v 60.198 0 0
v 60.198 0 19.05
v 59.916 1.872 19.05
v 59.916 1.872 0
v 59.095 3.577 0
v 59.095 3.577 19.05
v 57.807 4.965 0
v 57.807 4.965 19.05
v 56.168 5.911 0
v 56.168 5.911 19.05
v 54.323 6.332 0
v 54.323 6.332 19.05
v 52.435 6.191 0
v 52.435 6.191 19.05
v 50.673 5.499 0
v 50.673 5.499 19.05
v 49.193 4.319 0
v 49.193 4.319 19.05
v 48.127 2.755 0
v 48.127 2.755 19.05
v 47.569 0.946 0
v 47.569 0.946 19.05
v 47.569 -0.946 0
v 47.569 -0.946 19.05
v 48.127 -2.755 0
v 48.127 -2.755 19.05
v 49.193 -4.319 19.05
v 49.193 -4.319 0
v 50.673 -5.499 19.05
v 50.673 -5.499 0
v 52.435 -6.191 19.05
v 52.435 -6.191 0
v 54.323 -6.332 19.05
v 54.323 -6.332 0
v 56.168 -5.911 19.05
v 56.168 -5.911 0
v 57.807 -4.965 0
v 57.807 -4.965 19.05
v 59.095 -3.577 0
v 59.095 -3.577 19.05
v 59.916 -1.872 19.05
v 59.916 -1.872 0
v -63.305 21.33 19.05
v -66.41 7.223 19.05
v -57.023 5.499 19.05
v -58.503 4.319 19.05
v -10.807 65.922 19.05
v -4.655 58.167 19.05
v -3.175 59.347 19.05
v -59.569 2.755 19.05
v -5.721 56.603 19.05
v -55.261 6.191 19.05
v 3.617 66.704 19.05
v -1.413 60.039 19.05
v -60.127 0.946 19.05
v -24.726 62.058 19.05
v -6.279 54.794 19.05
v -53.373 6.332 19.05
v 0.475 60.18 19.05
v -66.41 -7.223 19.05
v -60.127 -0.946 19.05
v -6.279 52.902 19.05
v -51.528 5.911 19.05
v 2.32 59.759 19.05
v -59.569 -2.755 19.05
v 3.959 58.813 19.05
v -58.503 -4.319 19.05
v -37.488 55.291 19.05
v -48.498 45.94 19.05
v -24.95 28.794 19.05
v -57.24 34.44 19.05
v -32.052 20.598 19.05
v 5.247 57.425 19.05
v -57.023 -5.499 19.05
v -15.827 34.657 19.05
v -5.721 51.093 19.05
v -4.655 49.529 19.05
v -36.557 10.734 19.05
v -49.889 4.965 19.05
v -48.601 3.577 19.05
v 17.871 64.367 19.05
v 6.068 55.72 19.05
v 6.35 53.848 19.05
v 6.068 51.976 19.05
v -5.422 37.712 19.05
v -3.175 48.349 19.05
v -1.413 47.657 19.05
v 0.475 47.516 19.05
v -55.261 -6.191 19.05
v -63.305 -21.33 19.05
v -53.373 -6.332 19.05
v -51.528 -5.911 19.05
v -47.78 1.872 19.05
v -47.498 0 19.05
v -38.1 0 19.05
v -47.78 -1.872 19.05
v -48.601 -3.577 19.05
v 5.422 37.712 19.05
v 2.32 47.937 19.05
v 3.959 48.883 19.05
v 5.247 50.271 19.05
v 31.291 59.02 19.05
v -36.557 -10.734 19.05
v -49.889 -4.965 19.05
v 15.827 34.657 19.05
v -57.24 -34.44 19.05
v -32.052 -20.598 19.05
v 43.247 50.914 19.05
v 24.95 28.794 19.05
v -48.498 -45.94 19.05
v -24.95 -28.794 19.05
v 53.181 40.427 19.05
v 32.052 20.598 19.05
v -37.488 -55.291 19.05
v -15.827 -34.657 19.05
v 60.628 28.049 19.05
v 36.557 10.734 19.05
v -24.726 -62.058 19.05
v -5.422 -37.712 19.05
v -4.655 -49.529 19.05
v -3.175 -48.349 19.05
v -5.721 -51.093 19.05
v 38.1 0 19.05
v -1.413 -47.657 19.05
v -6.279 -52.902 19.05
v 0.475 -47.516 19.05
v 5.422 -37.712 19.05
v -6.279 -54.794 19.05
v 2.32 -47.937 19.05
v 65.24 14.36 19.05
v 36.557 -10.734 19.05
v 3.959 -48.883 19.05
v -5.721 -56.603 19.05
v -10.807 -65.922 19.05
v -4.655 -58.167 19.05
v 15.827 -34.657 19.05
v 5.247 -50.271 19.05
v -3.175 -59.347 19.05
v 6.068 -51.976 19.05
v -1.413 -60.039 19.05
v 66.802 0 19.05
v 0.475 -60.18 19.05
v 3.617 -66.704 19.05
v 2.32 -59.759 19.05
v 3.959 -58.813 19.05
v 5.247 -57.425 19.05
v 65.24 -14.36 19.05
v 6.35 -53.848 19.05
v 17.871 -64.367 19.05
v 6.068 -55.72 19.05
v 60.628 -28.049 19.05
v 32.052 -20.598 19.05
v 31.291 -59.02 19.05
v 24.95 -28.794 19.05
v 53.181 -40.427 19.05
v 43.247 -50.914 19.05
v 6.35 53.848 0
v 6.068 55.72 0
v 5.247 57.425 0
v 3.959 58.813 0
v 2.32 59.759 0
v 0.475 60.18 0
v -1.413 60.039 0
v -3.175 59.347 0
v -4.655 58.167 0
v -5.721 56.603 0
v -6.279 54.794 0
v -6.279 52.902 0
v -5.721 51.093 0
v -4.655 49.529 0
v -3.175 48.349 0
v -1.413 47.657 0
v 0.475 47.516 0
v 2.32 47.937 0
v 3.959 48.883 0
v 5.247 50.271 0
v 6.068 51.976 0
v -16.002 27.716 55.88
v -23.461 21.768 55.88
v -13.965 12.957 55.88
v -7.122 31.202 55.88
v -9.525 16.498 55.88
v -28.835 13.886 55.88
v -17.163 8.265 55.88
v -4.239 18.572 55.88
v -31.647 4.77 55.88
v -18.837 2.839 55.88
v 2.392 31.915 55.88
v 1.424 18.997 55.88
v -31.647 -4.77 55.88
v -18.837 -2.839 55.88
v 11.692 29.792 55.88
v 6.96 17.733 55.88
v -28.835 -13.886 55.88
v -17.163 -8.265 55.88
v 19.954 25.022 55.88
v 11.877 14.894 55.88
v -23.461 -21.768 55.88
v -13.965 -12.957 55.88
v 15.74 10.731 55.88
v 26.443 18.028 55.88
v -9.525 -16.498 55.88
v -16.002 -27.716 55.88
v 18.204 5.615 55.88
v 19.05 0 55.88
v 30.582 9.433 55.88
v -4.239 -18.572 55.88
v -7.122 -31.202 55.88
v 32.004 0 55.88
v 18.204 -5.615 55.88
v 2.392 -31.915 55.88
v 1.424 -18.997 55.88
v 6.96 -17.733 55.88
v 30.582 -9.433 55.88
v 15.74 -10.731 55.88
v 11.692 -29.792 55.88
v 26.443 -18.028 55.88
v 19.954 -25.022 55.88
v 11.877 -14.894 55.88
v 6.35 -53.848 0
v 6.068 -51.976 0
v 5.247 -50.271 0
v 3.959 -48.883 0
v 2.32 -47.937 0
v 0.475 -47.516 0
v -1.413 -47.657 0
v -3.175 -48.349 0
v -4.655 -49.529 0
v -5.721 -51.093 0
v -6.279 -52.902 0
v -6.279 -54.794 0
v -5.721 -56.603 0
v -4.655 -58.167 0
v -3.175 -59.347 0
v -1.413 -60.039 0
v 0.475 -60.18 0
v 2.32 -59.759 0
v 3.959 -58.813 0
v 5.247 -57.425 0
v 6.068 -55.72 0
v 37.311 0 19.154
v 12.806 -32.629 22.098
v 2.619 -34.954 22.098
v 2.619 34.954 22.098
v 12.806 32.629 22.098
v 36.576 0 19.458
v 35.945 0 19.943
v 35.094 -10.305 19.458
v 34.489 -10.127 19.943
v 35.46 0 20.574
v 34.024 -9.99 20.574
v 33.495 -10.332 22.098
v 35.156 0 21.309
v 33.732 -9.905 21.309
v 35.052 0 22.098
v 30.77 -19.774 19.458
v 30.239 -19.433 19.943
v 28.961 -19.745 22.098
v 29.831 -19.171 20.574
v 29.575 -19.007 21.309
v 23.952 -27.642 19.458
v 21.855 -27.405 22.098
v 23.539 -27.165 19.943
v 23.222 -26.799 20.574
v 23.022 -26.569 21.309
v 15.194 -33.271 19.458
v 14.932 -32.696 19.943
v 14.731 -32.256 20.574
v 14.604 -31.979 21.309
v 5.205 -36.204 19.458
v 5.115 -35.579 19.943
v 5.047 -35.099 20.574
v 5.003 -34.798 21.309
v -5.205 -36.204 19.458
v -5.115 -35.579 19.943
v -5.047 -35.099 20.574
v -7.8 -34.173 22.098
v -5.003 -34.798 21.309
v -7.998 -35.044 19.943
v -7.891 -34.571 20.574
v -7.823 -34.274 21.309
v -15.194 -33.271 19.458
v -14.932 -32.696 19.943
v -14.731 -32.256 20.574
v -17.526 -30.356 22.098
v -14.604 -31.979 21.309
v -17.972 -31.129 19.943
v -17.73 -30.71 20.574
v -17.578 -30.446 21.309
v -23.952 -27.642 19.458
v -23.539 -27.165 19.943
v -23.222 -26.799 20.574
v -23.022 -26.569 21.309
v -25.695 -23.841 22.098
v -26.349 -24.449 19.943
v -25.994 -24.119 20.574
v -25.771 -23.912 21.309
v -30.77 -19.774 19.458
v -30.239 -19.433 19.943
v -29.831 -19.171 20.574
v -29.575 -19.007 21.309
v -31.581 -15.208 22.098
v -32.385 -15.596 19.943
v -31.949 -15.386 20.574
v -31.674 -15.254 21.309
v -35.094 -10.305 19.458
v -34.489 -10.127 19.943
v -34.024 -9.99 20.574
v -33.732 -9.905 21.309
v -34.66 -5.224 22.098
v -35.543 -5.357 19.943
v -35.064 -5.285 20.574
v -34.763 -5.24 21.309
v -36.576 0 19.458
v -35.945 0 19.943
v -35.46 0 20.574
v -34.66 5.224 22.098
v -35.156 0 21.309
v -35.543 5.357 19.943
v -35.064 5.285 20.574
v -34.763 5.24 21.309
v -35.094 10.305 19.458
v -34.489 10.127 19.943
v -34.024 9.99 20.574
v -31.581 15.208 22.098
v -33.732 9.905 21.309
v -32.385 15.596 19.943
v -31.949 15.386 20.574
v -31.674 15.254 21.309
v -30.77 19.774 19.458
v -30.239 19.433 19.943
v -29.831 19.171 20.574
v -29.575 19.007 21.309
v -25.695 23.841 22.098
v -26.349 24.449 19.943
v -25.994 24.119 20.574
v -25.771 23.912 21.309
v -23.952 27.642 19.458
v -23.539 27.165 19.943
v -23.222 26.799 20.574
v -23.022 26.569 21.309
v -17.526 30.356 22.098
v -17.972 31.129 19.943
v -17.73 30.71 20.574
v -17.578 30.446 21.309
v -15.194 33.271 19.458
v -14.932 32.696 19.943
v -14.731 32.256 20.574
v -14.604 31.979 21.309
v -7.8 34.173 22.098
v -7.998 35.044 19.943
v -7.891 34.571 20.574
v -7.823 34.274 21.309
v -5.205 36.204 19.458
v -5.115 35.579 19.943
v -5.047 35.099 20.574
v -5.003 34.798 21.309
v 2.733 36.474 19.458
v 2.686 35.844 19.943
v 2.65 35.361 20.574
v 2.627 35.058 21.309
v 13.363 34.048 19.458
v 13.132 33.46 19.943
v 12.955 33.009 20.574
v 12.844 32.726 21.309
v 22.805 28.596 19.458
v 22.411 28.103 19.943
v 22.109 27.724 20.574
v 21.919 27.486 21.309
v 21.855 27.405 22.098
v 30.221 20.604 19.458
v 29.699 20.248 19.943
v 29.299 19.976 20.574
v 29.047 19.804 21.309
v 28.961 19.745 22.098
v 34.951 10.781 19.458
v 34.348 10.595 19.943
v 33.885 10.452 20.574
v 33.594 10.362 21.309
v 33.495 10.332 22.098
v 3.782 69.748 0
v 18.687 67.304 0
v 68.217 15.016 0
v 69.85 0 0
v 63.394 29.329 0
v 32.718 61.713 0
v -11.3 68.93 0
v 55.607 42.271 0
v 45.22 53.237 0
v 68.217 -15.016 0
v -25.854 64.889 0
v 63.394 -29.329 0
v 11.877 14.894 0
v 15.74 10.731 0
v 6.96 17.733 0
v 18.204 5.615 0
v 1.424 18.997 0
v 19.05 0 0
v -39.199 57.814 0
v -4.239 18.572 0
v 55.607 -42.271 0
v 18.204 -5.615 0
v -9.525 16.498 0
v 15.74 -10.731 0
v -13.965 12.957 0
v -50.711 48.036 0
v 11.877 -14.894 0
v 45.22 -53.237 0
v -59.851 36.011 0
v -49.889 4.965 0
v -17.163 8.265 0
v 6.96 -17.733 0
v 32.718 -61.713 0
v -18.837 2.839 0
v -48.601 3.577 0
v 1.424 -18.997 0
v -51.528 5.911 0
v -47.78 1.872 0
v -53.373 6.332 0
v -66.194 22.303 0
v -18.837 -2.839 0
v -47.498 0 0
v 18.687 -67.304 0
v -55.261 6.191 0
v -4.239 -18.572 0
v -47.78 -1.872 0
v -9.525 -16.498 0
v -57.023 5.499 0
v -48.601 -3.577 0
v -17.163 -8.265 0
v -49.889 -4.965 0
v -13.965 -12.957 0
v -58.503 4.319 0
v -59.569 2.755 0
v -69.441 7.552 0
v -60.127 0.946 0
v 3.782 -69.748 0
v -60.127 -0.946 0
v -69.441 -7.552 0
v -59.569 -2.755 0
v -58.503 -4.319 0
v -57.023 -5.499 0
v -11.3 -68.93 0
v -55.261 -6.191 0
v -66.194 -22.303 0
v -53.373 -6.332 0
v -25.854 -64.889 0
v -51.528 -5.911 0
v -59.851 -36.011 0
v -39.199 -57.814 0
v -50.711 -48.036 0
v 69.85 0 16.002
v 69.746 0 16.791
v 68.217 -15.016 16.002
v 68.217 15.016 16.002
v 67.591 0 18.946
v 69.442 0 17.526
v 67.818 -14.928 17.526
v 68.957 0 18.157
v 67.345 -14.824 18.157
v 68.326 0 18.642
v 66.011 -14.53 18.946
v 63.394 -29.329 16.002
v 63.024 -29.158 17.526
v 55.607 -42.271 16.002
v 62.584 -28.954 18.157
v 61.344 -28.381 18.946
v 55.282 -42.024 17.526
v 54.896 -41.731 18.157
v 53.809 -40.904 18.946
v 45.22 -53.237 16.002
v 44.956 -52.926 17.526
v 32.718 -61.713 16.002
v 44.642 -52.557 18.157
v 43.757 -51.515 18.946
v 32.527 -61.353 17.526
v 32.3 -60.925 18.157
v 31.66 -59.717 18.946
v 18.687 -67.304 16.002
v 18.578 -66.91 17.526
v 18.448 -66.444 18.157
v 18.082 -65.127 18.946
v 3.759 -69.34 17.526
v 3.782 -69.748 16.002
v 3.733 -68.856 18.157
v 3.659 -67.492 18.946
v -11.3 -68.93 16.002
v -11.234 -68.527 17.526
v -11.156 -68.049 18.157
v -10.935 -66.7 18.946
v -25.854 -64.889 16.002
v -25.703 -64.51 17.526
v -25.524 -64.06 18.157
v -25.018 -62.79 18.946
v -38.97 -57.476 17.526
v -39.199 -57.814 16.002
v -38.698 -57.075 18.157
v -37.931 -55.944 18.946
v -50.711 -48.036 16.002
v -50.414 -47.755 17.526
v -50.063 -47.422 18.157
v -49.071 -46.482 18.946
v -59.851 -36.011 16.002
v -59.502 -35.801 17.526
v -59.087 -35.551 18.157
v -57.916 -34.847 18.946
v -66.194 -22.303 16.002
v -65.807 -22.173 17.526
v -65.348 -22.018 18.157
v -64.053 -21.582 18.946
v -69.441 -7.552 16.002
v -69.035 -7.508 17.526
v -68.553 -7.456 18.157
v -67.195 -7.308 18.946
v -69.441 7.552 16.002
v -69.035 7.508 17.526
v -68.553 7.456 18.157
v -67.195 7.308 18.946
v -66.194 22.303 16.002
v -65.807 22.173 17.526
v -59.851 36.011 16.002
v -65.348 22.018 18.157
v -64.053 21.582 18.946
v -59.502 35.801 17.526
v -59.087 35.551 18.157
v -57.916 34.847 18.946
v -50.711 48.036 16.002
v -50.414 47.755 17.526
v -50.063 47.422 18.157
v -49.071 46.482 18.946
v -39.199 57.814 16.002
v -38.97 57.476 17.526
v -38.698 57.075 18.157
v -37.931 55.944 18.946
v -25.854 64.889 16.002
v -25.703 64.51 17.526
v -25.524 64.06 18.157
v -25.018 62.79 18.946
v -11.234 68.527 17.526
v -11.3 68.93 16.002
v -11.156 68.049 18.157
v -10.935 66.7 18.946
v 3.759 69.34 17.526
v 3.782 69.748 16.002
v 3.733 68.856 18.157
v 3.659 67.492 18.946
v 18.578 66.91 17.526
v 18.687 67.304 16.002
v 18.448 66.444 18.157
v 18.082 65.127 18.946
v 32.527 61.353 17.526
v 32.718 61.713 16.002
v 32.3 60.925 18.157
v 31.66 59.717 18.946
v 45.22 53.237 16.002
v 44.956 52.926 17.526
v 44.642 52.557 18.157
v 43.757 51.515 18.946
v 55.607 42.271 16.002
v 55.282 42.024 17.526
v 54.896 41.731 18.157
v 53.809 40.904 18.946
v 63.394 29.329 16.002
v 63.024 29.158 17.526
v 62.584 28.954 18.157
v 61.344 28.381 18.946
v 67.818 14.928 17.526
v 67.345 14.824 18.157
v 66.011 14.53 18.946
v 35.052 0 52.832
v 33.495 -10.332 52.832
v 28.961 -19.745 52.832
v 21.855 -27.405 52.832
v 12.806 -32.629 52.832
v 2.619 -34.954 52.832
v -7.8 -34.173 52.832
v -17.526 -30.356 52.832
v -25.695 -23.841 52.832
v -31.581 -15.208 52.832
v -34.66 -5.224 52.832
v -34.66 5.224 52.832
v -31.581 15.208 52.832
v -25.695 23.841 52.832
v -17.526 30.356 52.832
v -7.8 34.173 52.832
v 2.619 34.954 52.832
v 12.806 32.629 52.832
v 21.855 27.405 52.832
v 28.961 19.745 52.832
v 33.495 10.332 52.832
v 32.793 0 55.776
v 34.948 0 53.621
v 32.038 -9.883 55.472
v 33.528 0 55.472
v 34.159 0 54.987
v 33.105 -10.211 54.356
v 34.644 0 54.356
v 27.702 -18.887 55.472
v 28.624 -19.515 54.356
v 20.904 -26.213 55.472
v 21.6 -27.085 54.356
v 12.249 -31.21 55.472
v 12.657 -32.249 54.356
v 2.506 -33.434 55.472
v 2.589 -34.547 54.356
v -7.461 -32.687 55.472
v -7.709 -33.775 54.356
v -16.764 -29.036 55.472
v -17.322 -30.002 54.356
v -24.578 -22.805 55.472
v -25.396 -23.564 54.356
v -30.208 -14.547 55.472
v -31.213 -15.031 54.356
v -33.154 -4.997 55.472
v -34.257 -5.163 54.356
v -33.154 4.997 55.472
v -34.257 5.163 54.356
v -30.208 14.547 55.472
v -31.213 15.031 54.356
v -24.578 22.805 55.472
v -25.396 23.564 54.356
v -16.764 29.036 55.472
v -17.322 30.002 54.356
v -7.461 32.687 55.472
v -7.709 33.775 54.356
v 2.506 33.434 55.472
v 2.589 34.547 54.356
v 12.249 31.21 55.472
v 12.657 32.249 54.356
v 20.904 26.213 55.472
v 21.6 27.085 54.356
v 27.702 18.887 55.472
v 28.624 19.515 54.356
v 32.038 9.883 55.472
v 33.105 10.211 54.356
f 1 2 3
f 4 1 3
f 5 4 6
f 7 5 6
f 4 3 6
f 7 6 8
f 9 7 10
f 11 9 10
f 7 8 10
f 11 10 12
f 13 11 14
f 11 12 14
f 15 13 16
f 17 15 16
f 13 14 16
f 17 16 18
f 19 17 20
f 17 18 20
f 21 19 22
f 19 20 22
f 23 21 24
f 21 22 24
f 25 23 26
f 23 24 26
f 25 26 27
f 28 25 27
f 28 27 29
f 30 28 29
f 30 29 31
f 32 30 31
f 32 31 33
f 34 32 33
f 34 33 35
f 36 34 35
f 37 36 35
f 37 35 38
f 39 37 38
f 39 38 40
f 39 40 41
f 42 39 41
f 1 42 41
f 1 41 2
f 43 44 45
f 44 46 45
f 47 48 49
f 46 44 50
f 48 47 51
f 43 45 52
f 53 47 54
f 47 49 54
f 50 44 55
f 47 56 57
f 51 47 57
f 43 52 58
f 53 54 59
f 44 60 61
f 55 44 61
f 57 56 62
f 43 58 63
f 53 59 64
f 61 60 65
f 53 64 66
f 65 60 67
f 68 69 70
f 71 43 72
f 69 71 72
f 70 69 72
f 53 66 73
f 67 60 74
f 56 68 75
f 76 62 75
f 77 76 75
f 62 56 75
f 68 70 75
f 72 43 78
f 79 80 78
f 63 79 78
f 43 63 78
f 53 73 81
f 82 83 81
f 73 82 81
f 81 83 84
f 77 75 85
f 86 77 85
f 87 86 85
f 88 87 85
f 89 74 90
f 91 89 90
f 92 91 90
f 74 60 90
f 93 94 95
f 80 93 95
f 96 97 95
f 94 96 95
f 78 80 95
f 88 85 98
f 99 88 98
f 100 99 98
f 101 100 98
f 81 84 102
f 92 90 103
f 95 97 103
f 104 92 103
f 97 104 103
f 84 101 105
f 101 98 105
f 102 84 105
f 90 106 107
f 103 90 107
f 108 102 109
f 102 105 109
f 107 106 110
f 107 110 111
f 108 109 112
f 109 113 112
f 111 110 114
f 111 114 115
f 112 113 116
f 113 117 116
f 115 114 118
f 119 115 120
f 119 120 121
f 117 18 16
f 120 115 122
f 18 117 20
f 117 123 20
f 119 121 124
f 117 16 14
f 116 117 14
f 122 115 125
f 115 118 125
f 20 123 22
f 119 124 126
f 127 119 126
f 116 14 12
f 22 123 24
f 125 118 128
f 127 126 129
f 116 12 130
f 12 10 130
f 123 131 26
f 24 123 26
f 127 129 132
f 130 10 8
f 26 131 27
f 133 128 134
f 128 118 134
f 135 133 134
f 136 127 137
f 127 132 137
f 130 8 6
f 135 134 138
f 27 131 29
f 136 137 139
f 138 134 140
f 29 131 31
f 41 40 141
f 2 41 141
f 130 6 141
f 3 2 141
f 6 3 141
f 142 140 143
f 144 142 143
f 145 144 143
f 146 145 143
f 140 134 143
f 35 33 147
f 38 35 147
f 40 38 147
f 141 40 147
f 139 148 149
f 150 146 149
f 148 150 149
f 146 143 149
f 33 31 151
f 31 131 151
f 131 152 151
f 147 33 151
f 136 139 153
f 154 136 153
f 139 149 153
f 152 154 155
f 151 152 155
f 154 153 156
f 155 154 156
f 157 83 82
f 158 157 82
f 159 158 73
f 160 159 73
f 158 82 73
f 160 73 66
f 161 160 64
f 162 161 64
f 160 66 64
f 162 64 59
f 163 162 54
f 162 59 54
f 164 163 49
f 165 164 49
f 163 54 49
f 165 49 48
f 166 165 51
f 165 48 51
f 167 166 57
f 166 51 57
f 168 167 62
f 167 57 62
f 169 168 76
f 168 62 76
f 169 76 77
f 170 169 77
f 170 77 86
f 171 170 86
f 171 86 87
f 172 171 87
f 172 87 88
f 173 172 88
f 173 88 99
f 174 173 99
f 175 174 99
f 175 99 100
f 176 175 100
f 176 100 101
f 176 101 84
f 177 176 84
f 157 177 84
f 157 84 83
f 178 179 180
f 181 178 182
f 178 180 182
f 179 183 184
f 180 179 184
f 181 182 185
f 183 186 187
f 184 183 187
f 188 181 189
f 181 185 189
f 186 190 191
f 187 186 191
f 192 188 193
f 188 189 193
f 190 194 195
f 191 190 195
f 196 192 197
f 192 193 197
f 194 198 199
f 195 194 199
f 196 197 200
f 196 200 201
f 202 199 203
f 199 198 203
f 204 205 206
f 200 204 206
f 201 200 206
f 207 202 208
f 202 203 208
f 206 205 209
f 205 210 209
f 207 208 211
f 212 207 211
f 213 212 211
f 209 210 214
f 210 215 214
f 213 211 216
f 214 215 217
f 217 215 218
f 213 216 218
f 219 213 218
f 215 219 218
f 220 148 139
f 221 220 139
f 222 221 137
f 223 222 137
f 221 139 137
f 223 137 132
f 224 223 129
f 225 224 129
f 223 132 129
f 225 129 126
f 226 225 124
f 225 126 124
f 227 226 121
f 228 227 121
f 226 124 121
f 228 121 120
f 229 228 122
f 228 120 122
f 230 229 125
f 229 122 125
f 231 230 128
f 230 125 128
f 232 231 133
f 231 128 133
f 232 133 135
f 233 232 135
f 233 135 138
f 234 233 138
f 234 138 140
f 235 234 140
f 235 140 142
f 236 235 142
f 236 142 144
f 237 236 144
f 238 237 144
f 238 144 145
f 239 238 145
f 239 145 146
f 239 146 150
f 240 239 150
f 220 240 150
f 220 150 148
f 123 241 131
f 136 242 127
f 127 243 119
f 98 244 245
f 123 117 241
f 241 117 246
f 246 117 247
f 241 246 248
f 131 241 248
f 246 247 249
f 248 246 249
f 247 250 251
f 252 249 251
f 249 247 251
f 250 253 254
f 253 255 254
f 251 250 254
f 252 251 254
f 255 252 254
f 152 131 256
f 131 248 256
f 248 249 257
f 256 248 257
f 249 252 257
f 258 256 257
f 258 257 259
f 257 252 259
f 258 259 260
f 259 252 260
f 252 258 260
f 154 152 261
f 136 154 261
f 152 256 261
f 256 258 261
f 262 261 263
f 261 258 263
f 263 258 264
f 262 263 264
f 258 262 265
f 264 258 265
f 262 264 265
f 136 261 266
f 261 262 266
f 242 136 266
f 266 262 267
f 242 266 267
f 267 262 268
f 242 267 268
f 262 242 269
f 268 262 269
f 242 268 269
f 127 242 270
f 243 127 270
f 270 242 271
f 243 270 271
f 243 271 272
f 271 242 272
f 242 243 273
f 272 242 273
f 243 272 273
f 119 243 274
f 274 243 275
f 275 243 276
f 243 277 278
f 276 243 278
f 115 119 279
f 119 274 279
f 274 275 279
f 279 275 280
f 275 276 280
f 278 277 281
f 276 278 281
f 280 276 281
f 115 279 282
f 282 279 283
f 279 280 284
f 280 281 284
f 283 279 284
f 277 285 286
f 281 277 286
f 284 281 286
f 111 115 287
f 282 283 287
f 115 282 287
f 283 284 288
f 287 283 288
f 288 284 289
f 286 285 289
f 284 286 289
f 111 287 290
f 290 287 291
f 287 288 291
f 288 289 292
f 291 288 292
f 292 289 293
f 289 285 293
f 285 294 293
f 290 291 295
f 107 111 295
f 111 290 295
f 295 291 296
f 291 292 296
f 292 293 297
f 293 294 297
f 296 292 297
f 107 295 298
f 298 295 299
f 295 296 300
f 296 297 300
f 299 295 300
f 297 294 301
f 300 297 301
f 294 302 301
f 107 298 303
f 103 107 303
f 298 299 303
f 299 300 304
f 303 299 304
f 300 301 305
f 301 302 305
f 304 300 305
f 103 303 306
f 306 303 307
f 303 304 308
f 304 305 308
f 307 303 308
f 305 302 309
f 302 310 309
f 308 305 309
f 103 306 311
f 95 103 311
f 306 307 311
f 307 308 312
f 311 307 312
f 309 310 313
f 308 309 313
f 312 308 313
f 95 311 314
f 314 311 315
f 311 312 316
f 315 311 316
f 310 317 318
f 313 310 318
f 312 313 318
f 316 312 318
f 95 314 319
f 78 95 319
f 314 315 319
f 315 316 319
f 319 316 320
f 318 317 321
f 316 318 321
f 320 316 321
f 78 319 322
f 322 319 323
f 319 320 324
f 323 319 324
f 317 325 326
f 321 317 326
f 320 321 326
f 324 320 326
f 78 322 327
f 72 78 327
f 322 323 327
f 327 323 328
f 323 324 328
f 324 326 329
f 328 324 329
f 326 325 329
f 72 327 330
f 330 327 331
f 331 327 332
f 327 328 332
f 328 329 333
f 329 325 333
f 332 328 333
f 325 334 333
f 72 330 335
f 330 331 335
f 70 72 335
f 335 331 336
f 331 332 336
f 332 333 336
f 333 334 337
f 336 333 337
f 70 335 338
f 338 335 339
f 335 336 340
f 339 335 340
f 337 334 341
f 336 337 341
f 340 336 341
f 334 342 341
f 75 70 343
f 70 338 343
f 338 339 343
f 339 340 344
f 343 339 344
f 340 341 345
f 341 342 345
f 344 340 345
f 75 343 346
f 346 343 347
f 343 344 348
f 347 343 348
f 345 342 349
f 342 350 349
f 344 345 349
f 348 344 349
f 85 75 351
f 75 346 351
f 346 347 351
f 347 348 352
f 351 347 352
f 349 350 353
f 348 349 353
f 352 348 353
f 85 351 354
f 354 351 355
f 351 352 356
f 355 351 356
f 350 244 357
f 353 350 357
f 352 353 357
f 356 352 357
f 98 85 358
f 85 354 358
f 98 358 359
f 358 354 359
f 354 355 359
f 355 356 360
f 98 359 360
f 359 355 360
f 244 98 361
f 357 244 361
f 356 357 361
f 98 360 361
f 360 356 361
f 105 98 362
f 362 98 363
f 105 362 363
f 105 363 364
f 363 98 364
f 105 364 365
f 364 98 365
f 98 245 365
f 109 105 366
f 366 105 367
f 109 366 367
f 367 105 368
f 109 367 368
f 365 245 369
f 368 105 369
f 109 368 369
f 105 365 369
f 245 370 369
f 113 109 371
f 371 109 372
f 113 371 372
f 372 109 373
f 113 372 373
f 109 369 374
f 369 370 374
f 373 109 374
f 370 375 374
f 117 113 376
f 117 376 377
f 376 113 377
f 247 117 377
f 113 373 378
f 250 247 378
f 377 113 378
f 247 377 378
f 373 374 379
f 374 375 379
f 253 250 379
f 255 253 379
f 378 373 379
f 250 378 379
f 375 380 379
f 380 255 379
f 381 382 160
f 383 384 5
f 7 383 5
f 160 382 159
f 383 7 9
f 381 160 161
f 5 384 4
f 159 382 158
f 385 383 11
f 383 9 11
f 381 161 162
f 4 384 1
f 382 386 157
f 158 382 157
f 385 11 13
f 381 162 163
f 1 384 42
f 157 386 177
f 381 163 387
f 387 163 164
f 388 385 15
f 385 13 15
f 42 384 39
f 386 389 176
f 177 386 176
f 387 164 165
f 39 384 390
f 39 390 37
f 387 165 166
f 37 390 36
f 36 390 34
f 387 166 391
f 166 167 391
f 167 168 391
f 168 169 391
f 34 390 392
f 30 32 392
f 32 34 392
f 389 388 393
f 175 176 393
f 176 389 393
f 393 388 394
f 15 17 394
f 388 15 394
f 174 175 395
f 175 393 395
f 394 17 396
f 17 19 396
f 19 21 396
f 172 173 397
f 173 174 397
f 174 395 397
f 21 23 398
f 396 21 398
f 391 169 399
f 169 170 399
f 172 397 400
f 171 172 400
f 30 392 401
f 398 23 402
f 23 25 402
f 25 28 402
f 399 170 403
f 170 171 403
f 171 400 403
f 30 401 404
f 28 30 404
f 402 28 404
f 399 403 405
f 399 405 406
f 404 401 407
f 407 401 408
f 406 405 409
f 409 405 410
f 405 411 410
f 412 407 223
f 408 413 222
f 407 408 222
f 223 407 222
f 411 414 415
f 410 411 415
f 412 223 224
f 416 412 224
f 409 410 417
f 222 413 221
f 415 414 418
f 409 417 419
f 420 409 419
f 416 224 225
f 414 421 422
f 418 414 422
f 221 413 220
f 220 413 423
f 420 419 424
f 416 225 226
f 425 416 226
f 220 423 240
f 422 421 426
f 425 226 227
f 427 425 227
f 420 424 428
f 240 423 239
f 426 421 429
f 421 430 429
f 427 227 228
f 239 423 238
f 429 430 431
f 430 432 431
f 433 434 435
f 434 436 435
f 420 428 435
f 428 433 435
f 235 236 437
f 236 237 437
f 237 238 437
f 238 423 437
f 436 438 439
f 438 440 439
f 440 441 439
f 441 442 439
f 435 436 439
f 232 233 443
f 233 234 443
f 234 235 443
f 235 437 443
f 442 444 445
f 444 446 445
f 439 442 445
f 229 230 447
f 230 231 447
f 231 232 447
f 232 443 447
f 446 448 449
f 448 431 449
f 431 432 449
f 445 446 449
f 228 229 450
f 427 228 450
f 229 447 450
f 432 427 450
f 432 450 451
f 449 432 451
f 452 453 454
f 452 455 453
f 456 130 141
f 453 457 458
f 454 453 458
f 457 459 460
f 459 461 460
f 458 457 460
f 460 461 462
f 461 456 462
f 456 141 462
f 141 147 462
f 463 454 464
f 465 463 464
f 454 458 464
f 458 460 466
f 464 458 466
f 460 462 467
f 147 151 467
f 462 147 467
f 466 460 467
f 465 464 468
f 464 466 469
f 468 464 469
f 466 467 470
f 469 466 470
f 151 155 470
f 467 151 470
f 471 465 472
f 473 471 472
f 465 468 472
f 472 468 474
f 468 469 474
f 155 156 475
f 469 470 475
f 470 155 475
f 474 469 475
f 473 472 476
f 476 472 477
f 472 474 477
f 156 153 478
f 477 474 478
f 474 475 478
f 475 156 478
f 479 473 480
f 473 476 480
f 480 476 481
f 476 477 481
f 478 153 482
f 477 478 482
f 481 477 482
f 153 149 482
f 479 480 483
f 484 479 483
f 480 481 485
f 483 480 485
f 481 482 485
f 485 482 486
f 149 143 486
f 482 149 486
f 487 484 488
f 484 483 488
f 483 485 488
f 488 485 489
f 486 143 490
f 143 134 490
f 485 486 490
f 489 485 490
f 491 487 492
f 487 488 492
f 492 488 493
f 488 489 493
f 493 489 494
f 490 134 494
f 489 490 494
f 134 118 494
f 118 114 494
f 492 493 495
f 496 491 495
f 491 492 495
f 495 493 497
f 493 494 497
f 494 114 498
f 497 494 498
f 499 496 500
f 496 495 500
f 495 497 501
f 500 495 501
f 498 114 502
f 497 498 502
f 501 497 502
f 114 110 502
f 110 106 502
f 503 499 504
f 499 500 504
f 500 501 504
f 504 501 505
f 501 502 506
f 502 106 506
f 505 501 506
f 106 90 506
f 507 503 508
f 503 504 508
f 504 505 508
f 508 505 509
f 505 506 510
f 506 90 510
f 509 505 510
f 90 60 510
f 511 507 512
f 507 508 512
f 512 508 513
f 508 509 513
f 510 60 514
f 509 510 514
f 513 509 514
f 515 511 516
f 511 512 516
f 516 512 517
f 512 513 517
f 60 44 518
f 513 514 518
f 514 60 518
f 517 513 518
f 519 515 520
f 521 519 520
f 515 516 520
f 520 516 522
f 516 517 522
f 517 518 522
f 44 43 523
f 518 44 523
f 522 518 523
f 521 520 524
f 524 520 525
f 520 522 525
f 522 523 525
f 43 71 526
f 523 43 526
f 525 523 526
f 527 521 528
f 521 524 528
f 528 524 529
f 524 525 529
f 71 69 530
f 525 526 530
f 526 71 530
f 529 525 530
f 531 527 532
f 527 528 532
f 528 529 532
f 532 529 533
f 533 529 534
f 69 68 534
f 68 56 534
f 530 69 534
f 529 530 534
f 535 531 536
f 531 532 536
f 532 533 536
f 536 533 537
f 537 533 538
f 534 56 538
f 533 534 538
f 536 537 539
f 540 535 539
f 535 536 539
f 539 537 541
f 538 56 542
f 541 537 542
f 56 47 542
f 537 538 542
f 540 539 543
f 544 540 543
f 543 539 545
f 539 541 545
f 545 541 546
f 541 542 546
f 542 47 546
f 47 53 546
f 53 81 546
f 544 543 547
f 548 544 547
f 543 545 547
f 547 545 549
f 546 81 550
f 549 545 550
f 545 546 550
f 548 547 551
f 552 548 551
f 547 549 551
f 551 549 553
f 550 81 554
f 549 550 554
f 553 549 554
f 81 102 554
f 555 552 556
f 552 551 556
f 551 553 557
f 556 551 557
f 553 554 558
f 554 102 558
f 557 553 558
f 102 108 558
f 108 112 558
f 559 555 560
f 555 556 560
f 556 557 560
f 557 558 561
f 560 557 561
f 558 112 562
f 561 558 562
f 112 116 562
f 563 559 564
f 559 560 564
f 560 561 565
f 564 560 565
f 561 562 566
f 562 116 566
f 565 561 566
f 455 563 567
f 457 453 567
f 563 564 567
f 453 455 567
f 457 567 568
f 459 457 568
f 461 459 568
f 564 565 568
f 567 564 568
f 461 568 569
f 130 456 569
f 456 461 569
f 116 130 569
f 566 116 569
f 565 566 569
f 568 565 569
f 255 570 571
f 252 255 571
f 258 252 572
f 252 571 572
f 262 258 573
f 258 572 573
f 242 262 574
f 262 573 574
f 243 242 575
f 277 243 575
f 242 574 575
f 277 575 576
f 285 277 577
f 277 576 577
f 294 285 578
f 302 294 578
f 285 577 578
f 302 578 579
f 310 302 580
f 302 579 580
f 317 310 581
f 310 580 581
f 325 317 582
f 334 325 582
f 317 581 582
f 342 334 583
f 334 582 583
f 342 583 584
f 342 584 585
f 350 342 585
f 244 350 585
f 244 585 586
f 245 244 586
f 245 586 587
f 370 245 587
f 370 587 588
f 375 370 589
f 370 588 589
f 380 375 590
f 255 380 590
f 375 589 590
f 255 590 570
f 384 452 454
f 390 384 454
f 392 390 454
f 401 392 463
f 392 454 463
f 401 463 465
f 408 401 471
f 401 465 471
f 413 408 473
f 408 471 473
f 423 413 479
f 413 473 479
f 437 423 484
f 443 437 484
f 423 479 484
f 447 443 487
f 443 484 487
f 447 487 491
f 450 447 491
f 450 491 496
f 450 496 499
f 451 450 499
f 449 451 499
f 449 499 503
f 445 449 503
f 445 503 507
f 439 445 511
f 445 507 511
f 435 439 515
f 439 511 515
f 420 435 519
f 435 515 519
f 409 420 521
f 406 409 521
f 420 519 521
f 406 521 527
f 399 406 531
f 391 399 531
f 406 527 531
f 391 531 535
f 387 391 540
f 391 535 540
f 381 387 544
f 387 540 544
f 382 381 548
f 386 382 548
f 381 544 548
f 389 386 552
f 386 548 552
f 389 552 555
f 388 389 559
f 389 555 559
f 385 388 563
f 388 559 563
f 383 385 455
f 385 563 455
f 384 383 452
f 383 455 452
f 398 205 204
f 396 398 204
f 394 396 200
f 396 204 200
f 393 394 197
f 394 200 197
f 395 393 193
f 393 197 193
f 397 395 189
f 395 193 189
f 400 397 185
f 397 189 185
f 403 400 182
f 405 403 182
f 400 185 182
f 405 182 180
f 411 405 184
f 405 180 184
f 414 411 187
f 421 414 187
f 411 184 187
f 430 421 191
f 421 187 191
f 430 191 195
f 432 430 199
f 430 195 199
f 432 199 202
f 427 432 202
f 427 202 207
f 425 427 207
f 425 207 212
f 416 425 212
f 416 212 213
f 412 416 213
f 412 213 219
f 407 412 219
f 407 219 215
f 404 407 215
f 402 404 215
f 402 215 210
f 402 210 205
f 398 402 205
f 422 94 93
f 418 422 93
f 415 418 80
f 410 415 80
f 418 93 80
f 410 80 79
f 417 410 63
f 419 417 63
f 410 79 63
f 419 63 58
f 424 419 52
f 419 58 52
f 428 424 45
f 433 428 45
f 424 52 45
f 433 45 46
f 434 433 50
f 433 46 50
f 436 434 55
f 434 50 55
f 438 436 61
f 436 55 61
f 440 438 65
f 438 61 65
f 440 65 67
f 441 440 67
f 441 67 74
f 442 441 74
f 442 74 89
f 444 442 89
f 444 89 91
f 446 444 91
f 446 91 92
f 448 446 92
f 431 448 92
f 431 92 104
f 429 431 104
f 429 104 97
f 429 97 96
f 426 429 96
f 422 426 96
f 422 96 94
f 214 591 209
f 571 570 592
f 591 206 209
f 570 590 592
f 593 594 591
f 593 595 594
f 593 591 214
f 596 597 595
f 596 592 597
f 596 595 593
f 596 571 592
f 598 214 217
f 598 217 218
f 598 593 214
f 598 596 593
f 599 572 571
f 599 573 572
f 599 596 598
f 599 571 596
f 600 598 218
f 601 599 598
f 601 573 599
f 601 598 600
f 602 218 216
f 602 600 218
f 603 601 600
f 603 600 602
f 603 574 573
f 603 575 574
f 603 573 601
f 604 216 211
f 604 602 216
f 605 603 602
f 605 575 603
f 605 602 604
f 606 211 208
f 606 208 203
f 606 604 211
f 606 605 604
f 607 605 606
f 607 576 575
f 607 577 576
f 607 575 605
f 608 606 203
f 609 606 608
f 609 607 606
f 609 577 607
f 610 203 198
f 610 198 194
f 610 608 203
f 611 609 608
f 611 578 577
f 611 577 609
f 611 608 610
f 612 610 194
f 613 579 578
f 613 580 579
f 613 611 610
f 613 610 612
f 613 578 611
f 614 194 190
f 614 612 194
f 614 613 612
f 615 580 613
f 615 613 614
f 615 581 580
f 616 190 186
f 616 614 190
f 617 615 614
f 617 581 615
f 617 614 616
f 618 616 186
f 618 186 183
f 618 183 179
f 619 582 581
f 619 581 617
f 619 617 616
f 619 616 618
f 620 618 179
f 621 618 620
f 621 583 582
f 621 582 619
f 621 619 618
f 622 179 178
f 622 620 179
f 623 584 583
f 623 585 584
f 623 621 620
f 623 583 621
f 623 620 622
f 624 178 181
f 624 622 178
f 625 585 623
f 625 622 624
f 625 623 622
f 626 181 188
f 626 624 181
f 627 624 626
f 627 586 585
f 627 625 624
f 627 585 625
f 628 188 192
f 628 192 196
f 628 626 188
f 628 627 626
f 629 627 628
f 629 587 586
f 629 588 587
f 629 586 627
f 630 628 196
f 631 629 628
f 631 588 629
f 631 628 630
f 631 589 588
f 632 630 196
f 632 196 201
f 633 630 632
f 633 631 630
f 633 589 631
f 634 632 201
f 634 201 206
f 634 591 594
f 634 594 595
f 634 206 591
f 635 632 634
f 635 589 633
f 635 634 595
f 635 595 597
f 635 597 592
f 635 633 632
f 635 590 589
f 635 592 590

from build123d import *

# Parameters (mm, degrees)
F2_R     = 19.05
F3_DEPTH = 55.881
F4_R     = 3.048
F5_R     = 6.35
F6_DEPTH = 19.051


with BuildPart() as f1:
    # F0 (on Front) → F1 (revolve)
    with BuildSketch(Plane.XZ):
        Polygon((0, 55.88), (0, 0), (69.85, 0), (69.85, 19.05), (35.052, 19.05), (35.052, 55.88), align=None)
    revolve(axis=Axis((0, 0, 27.94), (0, 0, -1)))

    # F2 (on face) → F3 (cut, through all)
    with BuildSketch(Plane.XY.offset(55.88)):
        Circle(F2_R)
    extrude(amount=-F3_DEPTH, mode=Mode.SUBTRACT)

    # F4
    f4_edges = [f1.edges().sort_by_distance(p)[0] for p in [
        (-35.052, 0, 55.88),
        (-69.85, 0, 19.05),
        (-35.052, 0, 19.05),
    ]]
    fillet(f4_edges, radius=F4_R)

    # F5 (on face) → F6 (cut, through all)
    with BuildSketch(Plane.XY.offset(19.05)):
        with Locations((-53.848, 0)):
            Circle(F5_R)
        with Locations((0, 53.848)):
            Circle(F5_R)
        with Locations((53.848, 0)):
            Circle(F5_R)
        with Locations((0, -53.848)):
            Circle(F5_R)
    extrude(amount=-F6_DEPTH, mode=Mode.SUBTRACT)


solid = f1.part
